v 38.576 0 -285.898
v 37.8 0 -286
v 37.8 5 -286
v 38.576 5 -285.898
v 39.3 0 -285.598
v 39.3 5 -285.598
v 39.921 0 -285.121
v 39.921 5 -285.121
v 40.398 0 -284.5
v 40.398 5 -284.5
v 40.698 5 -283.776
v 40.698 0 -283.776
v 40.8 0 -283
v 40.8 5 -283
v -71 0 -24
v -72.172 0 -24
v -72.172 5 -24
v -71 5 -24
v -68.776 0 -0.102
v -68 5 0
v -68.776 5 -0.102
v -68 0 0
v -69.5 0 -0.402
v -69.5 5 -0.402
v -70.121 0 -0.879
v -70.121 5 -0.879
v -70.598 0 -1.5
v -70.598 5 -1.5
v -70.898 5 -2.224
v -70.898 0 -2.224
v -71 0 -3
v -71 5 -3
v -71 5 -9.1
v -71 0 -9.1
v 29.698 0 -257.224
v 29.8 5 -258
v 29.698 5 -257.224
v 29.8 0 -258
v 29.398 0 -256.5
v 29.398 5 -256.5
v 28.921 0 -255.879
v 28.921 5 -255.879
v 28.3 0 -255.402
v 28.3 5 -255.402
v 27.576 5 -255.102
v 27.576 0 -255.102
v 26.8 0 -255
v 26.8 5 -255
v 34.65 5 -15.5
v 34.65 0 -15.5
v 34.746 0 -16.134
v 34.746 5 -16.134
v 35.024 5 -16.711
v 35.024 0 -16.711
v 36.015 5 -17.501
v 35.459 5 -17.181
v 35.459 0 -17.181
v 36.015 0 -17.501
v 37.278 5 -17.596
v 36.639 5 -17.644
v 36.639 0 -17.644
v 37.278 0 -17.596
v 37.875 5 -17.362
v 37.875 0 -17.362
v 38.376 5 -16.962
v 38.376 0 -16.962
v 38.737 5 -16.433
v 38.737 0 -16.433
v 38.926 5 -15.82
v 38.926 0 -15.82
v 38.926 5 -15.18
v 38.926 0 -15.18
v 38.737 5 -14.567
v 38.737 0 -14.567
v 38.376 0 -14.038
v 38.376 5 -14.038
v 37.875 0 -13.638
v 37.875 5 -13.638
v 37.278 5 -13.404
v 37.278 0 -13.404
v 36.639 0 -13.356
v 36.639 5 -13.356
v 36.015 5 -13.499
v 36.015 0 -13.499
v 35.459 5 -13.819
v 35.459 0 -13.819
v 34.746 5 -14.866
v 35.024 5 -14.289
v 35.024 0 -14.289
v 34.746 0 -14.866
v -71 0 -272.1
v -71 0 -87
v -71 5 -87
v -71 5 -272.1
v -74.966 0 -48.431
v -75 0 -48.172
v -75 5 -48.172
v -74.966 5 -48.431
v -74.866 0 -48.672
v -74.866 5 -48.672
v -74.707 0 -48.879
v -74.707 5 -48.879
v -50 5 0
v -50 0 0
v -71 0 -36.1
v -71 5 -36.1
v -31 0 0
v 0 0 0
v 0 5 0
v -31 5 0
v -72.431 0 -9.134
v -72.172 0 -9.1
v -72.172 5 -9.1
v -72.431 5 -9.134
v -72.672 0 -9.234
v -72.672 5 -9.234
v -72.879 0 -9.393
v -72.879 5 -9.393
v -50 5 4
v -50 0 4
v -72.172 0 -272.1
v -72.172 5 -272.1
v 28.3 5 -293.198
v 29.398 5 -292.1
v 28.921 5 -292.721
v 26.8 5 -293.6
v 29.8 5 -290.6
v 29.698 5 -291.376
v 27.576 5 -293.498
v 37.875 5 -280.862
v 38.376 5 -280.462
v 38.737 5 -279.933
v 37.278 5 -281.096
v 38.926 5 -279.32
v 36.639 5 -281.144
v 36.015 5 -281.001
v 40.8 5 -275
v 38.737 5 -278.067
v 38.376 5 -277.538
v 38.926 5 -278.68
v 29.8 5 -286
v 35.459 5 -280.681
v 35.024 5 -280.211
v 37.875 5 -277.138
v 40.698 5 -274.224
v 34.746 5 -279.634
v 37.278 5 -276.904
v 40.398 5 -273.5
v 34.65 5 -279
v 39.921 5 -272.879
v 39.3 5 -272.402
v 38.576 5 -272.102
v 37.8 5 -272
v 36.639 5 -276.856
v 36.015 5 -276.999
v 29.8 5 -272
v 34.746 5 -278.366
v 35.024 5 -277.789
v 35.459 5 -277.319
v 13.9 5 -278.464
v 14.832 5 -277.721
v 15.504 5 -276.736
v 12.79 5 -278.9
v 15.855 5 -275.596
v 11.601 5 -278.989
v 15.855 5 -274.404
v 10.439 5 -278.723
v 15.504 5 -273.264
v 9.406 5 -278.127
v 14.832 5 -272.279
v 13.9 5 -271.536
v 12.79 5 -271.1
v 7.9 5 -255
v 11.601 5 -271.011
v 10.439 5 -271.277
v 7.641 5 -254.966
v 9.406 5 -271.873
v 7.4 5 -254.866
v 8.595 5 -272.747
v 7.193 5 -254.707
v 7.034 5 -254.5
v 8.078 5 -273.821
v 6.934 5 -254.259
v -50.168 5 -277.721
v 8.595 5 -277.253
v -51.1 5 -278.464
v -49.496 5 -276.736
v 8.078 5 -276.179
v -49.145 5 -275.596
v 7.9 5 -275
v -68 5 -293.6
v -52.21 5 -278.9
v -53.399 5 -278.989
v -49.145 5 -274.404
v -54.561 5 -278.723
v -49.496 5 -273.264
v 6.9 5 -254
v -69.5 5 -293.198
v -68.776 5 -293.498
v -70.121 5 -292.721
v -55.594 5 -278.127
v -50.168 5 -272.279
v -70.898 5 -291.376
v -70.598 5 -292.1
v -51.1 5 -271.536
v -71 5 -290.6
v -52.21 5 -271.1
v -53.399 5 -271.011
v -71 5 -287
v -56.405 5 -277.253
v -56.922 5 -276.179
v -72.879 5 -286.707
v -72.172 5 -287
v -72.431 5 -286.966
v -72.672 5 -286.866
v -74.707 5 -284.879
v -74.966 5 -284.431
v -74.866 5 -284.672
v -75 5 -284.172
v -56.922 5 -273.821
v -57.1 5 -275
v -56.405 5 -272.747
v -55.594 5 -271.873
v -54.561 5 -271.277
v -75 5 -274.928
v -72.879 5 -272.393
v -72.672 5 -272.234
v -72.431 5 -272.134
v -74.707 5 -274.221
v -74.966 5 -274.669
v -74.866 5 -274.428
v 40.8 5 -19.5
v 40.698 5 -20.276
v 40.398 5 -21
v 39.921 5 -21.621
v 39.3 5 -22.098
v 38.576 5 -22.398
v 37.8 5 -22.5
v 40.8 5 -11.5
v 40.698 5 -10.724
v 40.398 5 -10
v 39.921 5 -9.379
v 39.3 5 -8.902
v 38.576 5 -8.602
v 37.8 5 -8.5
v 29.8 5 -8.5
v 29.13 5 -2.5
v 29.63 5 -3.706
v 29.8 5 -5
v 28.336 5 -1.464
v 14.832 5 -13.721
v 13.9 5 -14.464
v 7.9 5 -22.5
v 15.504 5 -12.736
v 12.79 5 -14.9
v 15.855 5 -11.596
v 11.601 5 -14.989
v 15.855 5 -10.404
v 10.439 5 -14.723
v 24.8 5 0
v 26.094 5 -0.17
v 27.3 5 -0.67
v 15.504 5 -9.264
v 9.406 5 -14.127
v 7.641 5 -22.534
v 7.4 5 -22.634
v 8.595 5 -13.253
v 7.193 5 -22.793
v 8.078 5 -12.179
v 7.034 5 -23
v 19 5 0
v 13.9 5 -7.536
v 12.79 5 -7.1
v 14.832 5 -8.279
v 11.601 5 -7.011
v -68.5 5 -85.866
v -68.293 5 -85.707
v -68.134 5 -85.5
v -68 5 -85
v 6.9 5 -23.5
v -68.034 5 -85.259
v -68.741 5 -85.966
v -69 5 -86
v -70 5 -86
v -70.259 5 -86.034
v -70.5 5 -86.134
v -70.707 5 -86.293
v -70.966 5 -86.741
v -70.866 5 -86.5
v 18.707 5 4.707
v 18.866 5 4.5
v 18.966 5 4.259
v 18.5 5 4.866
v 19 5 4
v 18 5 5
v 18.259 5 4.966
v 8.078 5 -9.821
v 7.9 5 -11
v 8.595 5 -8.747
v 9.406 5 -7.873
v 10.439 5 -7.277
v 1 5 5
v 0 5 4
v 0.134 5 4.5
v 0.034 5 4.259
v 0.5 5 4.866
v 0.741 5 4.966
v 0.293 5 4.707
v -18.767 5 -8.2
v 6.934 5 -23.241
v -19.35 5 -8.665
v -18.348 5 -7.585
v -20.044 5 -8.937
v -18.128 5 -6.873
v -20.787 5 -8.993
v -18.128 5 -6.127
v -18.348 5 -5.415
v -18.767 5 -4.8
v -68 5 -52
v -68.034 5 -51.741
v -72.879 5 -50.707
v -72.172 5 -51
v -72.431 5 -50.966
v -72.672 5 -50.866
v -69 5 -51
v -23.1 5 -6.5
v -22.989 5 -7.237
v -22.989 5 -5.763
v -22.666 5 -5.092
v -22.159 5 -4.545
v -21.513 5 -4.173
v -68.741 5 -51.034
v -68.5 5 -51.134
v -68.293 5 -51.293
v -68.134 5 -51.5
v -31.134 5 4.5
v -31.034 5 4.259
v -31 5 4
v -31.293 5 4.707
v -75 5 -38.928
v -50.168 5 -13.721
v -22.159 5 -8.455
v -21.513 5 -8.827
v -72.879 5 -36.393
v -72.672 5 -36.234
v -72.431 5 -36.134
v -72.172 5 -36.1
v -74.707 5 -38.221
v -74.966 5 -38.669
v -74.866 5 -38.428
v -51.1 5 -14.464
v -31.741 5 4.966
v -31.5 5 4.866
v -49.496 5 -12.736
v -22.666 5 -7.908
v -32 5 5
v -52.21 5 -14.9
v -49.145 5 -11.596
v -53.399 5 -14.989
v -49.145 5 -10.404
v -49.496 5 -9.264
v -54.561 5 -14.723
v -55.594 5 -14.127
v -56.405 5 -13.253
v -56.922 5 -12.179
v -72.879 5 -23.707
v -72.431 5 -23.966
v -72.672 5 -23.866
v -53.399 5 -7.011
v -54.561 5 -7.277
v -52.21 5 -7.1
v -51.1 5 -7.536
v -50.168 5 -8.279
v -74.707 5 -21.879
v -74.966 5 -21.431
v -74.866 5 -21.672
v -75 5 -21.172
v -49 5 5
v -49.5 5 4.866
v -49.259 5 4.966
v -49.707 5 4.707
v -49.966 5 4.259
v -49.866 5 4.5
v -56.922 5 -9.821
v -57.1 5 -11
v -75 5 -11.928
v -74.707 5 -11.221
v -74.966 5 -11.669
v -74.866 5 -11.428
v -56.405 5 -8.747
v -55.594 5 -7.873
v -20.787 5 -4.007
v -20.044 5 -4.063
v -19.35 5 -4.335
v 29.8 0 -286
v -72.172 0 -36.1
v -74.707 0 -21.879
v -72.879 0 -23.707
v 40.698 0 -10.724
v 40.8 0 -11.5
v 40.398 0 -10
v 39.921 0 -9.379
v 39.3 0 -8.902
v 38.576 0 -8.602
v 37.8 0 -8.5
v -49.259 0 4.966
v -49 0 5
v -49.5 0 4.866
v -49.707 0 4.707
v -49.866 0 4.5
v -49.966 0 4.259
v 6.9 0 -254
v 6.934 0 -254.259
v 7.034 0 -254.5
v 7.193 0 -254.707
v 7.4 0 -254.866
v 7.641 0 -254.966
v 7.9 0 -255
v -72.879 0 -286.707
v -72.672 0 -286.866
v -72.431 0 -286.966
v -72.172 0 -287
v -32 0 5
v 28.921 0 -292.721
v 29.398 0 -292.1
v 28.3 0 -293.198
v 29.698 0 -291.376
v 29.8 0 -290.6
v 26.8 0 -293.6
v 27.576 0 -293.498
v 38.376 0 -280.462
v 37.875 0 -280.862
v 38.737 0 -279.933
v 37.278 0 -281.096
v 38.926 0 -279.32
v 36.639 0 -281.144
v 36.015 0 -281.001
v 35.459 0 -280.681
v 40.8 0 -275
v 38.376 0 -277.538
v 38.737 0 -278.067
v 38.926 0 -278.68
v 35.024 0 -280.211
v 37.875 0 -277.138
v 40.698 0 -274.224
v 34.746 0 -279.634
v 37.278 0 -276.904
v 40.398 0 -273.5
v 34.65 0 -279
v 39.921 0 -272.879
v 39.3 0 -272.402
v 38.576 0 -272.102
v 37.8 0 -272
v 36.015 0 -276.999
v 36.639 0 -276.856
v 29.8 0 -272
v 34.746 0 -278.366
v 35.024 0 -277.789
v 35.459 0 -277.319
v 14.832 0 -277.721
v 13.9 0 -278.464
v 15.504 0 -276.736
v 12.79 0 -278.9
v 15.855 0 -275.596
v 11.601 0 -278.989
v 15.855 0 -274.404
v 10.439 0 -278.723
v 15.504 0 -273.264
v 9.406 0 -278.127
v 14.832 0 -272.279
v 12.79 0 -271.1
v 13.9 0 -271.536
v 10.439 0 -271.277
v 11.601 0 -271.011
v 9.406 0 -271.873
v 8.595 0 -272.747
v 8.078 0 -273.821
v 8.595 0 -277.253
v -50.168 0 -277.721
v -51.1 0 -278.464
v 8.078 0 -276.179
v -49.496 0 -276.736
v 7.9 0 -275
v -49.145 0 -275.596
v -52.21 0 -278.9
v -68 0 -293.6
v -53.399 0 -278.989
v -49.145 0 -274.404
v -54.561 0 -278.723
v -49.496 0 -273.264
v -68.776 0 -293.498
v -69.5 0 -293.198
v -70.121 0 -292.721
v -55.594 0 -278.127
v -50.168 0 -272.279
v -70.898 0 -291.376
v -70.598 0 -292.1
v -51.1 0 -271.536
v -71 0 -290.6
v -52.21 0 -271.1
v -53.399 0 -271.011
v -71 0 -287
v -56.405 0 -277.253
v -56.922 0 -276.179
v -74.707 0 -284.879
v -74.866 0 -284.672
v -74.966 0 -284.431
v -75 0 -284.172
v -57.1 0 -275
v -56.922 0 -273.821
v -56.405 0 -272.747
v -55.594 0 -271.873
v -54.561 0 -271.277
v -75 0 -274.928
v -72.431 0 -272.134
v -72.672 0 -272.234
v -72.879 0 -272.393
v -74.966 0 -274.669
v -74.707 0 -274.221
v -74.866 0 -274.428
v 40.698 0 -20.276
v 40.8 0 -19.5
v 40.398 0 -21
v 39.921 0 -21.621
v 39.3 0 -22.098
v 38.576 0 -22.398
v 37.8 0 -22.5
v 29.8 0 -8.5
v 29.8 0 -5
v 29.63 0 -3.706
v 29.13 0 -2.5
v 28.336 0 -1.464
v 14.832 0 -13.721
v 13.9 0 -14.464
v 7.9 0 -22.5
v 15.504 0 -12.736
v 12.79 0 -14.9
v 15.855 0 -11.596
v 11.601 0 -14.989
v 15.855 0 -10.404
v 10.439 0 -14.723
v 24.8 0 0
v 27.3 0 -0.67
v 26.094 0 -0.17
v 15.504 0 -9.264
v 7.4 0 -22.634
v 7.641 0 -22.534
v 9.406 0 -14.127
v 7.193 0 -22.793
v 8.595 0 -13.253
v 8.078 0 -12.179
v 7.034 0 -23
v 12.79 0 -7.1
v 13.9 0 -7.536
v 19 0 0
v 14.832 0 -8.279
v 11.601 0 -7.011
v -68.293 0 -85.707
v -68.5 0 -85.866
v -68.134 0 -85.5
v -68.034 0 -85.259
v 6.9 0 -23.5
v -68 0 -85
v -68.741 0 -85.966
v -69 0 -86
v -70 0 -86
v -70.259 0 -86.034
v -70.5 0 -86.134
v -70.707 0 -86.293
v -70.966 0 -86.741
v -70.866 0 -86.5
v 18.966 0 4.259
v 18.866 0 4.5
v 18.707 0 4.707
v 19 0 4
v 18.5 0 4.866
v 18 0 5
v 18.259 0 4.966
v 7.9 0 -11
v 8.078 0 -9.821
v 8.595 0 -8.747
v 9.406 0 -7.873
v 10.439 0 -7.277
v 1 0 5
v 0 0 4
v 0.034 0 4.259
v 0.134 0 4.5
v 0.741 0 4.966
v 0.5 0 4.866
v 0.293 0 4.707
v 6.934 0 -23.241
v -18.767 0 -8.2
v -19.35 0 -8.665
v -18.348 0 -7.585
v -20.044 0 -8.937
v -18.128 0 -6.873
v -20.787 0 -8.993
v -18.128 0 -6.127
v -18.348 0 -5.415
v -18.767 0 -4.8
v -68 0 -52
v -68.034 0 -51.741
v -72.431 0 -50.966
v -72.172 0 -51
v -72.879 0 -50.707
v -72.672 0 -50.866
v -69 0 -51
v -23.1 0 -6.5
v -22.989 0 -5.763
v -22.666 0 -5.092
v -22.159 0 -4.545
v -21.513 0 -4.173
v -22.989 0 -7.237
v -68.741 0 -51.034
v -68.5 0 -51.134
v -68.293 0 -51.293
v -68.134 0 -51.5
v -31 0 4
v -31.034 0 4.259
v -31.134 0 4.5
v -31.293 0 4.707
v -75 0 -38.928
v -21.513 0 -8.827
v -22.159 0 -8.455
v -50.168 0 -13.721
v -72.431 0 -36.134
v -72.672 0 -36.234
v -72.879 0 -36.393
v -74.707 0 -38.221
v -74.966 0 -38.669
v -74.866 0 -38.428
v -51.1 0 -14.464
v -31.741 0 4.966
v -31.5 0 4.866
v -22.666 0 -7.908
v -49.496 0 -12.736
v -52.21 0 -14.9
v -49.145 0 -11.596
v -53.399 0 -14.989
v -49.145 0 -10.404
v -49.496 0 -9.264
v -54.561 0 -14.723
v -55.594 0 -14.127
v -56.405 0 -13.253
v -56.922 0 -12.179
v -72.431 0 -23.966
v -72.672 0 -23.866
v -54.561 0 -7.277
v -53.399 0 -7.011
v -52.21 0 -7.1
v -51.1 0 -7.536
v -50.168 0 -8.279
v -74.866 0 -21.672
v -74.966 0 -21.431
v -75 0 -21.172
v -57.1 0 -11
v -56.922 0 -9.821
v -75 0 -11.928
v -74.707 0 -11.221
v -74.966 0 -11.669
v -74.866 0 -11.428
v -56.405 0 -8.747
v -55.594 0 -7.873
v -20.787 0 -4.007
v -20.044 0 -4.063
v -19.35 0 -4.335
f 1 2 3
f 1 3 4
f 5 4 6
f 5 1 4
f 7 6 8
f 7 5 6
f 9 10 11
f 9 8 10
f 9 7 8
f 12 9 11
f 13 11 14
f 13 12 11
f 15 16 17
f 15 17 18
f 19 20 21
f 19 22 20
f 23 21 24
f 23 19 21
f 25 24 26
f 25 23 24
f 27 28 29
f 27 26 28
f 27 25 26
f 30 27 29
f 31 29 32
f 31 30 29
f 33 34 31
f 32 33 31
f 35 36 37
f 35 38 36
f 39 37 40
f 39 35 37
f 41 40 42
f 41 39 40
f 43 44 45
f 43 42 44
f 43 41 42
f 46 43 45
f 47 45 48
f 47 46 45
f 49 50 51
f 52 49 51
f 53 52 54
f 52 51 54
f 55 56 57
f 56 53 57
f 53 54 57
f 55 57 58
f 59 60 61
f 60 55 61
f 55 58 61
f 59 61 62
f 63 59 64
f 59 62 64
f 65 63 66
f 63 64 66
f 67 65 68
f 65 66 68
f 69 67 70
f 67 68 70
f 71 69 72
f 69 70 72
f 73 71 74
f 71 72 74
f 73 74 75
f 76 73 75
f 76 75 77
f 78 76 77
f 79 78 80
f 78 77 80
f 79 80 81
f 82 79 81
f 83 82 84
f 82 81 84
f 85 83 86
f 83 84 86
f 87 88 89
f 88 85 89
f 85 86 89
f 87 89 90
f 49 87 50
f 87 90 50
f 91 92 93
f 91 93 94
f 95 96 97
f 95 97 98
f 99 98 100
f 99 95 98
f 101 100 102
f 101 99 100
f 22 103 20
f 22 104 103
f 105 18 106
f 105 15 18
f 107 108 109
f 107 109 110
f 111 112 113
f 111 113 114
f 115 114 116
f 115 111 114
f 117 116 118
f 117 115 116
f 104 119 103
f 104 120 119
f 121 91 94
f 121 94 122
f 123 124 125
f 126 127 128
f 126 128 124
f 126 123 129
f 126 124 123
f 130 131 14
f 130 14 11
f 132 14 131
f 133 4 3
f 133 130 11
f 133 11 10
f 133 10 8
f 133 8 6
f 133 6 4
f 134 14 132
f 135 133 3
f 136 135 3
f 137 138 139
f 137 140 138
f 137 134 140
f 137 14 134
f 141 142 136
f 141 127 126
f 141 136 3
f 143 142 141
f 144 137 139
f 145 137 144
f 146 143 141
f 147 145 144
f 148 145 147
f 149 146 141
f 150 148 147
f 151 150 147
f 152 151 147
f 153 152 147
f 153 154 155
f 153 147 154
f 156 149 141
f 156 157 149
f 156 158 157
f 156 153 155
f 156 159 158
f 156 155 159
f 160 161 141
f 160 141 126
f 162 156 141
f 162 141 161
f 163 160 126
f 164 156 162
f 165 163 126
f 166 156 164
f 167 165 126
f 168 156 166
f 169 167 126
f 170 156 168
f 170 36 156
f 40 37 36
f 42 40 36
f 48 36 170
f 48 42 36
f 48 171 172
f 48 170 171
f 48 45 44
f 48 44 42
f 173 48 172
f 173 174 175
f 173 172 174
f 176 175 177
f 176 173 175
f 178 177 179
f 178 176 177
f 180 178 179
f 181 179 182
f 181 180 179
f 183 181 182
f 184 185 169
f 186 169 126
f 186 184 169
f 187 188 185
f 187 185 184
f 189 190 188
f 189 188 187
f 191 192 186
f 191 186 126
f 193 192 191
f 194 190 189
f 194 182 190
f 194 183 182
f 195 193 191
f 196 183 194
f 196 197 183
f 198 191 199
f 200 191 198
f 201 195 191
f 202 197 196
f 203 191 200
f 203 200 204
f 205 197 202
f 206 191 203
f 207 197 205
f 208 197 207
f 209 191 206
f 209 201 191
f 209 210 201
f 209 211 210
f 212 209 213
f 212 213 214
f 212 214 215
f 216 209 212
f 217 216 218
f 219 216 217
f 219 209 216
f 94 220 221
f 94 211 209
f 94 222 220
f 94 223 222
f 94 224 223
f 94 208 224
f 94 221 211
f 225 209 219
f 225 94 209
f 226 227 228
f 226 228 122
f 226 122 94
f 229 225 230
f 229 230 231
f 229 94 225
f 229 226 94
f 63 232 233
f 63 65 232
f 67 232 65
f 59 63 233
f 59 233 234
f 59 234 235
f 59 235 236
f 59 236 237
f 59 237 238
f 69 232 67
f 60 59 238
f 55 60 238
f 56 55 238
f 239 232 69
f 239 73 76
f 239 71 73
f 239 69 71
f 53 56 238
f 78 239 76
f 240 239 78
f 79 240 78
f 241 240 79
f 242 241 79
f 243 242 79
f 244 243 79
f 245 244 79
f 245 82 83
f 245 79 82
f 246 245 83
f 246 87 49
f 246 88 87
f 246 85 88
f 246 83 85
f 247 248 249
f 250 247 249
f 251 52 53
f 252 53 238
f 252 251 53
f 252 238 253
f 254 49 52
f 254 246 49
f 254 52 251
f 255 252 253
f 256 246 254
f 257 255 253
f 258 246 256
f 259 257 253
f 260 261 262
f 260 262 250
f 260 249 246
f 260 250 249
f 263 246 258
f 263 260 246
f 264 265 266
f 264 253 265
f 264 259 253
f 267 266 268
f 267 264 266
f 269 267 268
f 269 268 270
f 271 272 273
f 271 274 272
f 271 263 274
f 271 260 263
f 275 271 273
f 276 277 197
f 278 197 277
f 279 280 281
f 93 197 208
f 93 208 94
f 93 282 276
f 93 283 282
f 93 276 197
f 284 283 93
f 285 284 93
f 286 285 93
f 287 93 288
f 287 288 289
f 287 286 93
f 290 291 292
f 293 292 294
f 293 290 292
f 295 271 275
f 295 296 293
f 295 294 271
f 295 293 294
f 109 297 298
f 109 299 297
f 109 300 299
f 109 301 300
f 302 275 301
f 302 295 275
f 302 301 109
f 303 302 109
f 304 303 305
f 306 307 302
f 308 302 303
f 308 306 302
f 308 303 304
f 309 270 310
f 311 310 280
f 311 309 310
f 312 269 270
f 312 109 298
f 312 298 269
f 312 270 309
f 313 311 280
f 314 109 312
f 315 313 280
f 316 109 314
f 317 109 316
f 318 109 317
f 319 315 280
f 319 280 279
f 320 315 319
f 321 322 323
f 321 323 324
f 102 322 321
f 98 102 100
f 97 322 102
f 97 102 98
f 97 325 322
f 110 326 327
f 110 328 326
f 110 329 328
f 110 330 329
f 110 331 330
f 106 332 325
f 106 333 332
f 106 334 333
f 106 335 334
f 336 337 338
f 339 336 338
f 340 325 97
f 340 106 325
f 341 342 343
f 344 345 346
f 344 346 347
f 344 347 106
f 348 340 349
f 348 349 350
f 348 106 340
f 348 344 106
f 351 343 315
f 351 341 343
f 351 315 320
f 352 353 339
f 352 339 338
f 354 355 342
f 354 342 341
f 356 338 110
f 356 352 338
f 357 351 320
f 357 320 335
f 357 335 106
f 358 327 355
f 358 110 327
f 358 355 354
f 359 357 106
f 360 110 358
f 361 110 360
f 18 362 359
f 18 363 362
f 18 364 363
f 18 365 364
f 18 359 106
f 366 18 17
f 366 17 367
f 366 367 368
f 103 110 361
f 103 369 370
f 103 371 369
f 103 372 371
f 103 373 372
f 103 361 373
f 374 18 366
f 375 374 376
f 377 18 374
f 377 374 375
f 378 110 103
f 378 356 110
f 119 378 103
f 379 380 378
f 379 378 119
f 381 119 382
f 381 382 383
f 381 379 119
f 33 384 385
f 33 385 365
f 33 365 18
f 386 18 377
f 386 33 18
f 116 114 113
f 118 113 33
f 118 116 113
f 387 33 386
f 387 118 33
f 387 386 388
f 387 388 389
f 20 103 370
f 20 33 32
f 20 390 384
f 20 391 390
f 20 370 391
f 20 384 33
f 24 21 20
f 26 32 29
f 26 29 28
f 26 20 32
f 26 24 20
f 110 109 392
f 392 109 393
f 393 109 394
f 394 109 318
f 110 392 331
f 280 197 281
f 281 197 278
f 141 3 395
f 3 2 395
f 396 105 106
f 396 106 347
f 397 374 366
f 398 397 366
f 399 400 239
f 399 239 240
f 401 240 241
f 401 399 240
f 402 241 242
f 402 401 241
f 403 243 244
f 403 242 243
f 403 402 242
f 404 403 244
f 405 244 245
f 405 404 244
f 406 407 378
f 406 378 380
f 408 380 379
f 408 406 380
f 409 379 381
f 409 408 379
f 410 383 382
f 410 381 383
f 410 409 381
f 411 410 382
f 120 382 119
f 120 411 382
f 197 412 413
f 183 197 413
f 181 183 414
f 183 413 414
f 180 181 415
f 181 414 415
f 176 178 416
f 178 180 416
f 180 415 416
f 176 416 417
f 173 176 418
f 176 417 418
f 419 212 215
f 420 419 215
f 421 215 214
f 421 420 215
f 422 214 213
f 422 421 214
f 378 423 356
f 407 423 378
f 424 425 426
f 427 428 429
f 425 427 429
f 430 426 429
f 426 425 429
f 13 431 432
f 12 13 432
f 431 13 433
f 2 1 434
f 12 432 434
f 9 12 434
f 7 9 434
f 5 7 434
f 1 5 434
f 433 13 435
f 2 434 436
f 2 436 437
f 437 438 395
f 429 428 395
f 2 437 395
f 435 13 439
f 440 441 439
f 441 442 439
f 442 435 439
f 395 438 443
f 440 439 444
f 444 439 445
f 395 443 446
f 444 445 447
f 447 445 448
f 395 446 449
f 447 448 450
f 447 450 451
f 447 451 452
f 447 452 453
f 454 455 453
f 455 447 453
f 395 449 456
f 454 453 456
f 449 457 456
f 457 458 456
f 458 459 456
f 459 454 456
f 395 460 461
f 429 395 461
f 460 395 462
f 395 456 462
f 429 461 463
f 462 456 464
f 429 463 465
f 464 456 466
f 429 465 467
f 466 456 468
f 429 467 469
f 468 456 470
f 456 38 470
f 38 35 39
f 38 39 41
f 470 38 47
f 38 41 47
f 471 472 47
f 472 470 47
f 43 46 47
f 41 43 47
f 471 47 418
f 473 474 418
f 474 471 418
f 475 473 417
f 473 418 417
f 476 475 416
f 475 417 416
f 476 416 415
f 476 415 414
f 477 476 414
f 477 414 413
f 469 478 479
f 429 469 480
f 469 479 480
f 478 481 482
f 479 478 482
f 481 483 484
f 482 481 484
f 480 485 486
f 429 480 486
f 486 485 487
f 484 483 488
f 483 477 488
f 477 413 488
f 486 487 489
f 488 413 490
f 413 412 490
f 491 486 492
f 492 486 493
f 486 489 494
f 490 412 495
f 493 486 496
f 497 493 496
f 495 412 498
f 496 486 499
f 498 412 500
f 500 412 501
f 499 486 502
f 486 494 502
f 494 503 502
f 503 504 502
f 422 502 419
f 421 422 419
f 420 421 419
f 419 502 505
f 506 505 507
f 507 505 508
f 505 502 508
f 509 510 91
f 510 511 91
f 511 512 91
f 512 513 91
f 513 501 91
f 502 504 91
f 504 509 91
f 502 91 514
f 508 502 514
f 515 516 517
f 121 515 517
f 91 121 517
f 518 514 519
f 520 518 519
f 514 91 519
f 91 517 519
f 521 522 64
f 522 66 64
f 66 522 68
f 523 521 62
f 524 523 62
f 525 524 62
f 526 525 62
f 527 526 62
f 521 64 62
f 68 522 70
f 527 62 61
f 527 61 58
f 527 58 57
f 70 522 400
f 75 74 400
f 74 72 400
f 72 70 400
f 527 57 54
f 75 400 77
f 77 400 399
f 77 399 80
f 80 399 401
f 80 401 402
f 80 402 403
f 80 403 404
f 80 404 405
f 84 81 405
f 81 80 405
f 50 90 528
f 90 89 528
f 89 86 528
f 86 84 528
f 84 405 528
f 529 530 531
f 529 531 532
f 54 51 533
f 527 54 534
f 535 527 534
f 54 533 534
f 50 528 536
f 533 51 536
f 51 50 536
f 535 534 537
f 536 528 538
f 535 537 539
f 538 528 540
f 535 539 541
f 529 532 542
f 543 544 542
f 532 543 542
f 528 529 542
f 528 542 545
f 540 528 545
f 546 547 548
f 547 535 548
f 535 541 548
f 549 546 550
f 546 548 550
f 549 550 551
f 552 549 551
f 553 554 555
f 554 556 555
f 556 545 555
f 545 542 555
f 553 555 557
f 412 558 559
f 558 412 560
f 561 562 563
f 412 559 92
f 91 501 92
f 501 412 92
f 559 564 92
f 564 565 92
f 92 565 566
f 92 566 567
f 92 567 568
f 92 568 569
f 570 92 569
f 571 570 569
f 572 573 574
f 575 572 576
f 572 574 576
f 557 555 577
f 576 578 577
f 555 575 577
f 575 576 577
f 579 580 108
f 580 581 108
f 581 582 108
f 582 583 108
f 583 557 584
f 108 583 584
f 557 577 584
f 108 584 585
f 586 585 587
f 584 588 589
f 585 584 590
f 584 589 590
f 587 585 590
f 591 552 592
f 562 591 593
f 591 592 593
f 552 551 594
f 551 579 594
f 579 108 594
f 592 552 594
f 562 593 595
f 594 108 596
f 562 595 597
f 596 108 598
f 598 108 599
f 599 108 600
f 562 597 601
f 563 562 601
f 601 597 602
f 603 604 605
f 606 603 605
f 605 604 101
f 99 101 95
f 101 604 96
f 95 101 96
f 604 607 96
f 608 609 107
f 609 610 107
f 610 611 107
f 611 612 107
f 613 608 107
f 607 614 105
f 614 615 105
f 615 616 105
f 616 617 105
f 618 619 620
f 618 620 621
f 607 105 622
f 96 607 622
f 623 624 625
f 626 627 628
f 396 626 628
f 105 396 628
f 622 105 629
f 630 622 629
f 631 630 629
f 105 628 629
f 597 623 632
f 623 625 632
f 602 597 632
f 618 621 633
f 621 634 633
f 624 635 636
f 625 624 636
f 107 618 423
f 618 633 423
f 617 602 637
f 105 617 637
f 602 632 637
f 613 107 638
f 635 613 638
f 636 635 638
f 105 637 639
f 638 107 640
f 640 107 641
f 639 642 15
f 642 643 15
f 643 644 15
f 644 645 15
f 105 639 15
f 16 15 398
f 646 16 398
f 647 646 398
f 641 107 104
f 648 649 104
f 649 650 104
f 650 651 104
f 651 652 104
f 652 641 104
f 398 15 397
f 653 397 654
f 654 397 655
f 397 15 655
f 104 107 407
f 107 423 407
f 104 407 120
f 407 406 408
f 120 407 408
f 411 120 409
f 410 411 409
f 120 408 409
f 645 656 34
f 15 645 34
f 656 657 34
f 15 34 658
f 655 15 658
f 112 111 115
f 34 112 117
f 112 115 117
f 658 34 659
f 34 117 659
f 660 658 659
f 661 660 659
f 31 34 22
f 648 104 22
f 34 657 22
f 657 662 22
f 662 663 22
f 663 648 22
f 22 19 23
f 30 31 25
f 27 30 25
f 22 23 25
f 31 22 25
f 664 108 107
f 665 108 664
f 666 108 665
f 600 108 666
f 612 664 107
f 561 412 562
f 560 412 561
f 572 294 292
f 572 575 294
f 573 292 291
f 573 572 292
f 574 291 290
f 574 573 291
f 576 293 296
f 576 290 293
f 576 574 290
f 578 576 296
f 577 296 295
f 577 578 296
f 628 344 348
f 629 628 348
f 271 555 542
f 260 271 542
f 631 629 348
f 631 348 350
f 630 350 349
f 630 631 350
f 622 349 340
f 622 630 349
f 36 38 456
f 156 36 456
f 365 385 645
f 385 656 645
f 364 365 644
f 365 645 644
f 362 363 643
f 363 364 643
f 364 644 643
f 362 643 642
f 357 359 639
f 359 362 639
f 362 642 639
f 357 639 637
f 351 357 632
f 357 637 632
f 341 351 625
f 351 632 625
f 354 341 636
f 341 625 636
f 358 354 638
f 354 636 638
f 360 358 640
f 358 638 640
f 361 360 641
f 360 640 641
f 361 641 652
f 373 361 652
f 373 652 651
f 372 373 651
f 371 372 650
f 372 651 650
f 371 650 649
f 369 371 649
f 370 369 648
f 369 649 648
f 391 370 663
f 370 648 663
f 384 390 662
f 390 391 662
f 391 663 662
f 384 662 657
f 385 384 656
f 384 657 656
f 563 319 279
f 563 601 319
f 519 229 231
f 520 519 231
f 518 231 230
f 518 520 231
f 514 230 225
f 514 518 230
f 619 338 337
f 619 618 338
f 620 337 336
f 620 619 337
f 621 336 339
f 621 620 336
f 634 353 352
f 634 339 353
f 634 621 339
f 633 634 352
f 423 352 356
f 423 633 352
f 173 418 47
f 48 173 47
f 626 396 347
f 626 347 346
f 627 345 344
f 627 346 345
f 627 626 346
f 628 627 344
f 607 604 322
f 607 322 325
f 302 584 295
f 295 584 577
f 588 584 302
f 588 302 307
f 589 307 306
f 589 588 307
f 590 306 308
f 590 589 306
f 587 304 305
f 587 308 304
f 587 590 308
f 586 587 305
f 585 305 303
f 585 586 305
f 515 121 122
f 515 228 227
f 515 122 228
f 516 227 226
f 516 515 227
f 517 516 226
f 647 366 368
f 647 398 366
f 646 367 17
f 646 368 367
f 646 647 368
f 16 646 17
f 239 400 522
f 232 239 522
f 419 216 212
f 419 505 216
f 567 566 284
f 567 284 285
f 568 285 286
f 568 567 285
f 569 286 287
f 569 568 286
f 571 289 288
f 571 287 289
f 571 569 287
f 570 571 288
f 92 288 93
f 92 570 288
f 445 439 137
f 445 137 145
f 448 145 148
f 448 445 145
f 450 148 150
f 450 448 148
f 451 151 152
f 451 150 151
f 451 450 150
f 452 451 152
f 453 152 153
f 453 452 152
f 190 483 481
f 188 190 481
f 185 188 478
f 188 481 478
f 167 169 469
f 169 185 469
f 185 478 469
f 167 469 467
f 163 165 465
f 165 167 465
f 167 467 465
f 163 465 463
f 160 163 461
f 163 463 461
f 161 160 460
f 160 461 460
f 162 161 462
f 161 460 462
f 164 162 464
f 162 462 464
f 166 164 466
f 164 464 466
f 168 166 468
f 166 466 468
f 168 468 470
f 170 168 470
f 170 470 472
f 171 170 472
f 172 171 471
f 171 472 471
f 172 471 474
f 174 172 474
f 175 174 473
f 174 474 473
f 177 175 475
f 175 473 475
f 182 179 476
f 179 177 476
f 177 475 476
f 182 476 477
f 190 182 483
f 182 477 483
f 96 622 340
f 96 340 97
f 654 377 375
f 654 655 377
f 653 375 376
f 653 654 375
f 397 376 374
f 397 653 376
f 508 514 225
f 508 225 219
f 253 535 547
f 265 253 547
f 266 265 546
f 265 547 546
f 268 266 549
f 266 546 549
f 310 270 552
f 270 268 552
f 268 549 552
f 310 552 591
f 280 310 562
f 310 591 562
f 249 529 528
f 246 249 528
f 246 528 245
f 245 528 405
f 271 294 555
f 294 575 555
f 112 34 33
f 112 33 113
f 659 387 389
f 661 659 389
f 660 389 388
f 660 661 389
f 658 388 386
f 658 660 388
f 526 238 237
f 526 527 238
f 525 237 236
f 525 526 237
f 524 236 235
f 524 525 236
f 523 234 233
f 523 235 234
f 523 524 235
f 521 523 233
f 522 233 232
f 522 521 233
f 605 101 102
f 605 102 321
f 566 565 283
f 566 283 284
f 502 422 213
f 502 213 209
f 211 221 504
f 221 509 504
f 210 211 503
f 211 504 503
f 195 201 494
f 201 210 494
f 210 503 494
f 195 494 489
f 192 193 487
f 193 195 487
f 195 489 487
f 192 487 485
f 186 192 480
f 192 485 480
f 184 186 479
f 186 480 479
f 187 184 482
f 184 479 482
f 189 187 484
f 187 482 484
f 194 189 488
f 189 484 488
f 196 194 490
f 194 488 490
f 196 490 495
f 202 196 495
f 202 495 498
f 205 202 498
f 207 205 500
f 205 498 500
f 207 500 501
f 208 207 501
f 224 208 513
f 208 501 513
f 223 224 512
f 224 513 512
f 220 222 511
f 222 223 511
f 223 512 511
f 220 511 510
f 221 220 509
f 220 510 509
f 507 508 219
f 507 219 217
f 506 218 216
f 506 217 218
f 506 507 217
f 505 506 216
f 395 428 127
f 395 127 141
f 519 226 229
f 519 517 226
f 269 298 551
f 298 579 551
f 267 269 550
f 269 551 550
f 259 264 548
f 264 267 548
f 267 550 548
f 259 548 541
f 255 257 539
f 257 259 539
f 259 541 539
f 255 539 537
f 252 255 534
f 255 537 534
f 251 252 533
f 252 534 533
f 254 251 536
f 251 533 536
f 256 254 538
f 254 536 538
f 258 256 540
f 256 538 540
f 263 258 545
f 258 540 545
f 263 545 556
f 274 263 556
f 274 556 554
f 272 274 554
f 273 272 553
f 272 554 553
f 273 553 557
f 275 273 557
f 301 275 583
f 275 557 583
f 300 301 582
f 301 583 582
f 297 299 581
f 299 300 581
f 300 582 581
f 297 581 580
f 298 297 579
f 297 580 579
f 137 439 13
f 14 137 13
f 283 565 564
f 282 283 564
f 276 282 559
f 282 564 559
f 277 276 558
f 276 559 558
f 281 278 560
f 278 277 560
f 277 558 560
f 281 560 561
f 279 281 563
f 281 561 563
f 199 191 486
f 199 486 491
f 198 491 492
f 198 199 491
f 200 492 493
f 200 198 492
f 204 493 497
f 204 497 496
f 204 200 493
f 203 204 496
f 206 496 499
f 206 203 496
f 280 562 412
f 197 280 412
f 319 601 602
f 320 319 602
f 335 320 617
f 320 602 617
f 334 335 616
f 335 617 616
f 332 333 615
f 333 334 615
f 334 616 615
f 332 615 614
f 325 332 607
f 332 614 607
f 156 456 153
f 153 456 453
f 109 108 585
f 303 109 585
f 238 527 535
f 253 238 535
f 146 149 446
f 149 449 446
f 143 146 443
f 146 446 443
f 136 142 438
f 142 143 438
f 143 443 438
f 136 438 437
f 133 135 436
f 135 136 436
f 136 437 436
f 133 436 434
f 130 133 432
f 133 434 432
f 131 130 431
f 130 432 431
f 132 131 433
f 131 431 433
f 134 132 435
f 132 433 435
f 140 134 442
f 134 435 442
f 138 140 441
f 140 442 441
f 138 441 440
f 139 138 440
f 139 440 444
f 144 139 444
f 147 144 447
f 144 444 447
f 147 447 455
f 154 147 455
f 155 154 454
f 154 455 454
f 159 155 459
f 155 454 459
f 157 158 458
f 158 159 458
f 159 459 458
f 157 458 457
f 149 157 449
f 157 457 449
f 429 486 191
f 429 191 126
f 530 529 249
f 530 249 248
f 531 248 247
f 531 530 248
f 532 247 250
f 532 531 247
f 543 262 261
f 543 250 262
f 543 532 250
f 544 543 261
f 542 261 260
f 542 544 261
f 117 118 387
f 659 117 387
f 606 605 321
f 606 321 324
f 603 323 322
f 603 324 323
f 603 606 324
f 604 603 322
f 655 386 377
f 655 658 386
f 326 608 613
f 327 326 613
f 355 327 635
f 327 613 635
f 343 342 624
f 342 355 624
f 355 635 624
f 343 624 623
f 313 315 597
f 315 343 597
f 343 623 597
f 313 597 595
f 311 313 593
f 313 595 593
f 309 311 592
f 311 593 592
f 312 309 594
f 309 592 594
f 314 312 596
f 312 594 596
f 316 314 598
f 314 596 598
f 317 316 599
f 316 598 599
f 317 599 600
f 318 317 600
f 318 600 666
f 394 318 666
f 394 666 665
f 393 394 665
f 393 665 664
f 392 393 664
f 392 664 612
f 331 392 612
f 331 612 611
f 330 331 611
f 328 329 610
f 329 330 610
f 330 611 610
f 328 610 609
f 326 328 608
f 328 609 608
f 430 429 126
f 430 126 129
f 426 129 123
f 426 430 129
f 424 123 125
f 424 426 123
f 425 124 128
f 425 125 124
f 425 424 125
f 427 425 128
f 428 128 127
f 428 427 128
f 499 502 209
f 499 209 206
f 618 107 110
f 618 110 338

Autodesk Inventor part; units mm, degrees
ref_plane "YZ Plane" through (0, 0, 0) normal (1, 0, 0) x (0, 1, 0)
ref_plane "XZ Plane" through (0, 0, 0) normal (0, 1, 0) x (-1, 0, 0)
ref_plane "XY Plane" through (0, 0, 0) normal (0, 0, 1) x (1, 0, 0)
sketch "Sketch1" plane through (0, 0, 0) normal (0, 1, 0) x (-1, 0, 0)
  line L0 (0, 0) -> (31, 0)
  line L1 (31, 0) -> (31, 4)
  line L2 (32, 5) -> (49, 5)
  line L3 (50, 4) -> (50, 0)
  line L4 (50, 0) -> (68, 0)
  line L5 (68, -52) -> (68, -85)
  line L6 (69, -86) -> (70, -86)
  line L7 (71, -87) -> (71, -272.1)
  line L8 (71, -272.1) -> (72.1718, -272.1)
  line L9 (72.8789, -272.3929) -> (74.7071, -274.2211)
  line L10 (75, -274.9282) -> (75, -284.1718)
  line L11 (74.7071, -284.8789) -> (72.8789, -286.7071)
  line L12 (72.1718, -287) -> (71, -287)
  line L13 (71, -287) -> (71, -293.6)
  line L14 (71, -293.6) -> (-26.8, -293.6)
  line L15 (-29.8, -290.6) -> (-29.8, -286)
  line L16 (0, 0) -> (0, 4)
  line L17 (-1, 5) -> (-18, 5)
  line L18 (-19, 4) -> (-19, 0)
  line L19 (-19, 0) -> (-24.8, 0)
  line L20 (-29.8, -5) -> (-29.8, -8.5)
  line L21 (-29.8, -8.5) -> (-37.8, -8.5)
  line L22 (-40.8, -11.5) -> (-40.8, -19.5)
  line L23 (-37.8, -22.5) -> (-7.9, -22.5)
  line L24 (-6.9, -23.5) -> (-6.9, -254)
  line L25 (-7.9, -255) -> (-26.8, -255)
  line L26 (-29.8, -258) -> (-29.8, -272)
  line L27 (-29.8, -272) -> (-37.8, -272)
  line L28 (-40.8, -275) -> (-40.8, -283)
  line L29 (-37.8, -286) -> (-29.8, -286)
  circle A0 centre (53.1, -11) radius 4
  circle A1 centre (-11.9, -11) radius 4
  circle A2 centre (53.1, -275) radius 4
  circle A3 centre (-11.9, -275) radius 4
  line L30 (69, -51) -> (70, -51)
  arc A4 (-18, 5) -> (-19, 4) centre (-18, 4) ccw
  arc A5 (0, 4) -> (-1, 5) centre (-1, 4) ccw
  arc A6 (32, 5) -> (31, 4) centre (32, 4) ccw
  arc A7 (50, 4) -> (49, 5) centre (49, 4) ccw
  arc A8 (-24.8, 0) -> (-29.8, -5) centre (-24.8, -5) ccw
  arc A9 (-7.9, -255) -> (-6.9, -254) centre (-7.9, -254) ccw
  arc A10 (-26.8, -255) -> (-29.8, -258) centre (-26.8, -258) ccw
  arc A11 (-37.8, -272) -> (-40.8, -275) centre (-37.8, -275) ccw
  arc A12 (-40.8, -283) -> (-37.8, -286) centre (-37.8, -283) ccw
  arc A13 (-40.8, -19.5) -> (-37.8, -22.5) centre (-37.8, -19.5) ccw
  arc A14 (-37.8, -8.5) -> (-40.8, -11.5) centre (-37.8, -11.5) ccw
  arc A15 (72.8789, -272.3929) -> (72.1718, -272.1) centre (72.1718, -273.1) ccw
  arc A16 (75, -274.9282) -> (74.7071, -274.2211) centre (74, -274.9282) ccw
  arc A17 (74.7071, -284.8789) -> (75, -284.1718) centre (74, -284.1718) ccw
  arc A18 (72.1718, -287) -> (72.8789, -286.7071) centre (72.1718, -286) ccw
  line L31 (71, -9.1) -> (72.1718, -9.1)
  line L32 (72.8789, -9.3929) -> (74.7071, -11.2211)
  line L33 (75, -11.9282) -> (75, -21.1718)
  line L34 (74.7071, -21.8789) -> (72.8789, -23.7071)
  line L35 (72.1718, -24) -> (71, -24)
  arc A19 (72.8789, -9.3929) -> (72.1718, -9.1) centre (72.1718, -10.1) ccw
  arc A20 (75, -11.9282) -> (74.7071, -11.2211) centre (74, -11.9282) ccw
  arc A21 (74.7071, -21.8789) -> (75, -21.1718) centre (74, -21.1718) ccw
  arc A22 (72.1718, -24) -> (72.8789, -23.7071) centre (72.1718, -23) ccw
  line L36 (71, -36.1) -> (72.1718, -36.1)
  line L37 (72.8789, -36.3929) -> (74.7071, -38.2211)
  line L38 (75, -38.9282) -> (75, -48.1718)
  line L39 (74.7071, -48.8789) -> (72.8789, -50.7071)
  line L40 (72.1718, -51) -> (71, -51)
  arc A23 (72.8789, -36.3929) -> (72.1718, -36.1) centre (72.1718, -37.1) ccw
  arc A24 (75, -38.9282) -> (74.7071, -38.2211) centre (74, -38.9282) ccw
  arc A25 (74.7071, -48.8789) -> (75, -48.1718) centre (74, -48.1718) ccw
  arc A26 (72.1718, -51) -> (72.8789, -50.7071) centre (72.1718, -50) ccw
  line L41 (71, -9.1) -> (71, -3)
  line L42 (71, -24) -> (71, -36.1)
  arc A27 (69, -51) -> (68, -52) centre (69, -52) ccw
  arc A28 (68, -85) -> (69, -86) centre (69, -85) ccw
  arc A29 (71, -87) -> (70, -86) centre (70, -87) ccw
  line L43 (71, -51) -> (70, -51)
  arc A30 (71, -3) -> (68, 0) centre (68, -3) ccw
  arc A31 (-6.9, -23.5) -> (-7.9, -22.5) centre (-7.9, -23.5) ccw
  arc A32 (-29.8, -290.6) -> (-26.8, -293.6) centre (-26.8, -290.6) ccw
  circle A33 centre (-36.8, -15.5) radius 2.15
  circle A34 centre (-36.8, -279) radius 2.15
  circle A35 centre (20.6, -6.5) radius 2.5
  point P0 (31, 5)
  point P1 (50, 5)
  point P2 (71, 0)
  point P3 (68, -86)
  point P4 (71, -86)
  point P5 (72.586, -272.1)
  point P6 (72.586, -287)
  point P7 (0, 5)
  point P8 (59, 0)
  point P9 (50, 2)
  point P10 (71, -5)
  point P11 (-22.85, -22.5)
  point P12 (-33.8, -8.5)
  point P13 (71.5859, -287)
  point P14 (71.8793, -10)
  point P15 (69.5, -51)
  point P16 (-21.9, 0)
  point P17 (71.5859, -24)
  point P18 (71.5859, -51)
  point P19 (69.5, -86)
  point P20 (-29.8, -6.75)
  point P21 (40.5, 5)
  dimension "d0" = 90
  dimension "d1" = 31
  dimension "d3" = 19
  dimension "d4" = 19
  dimension "d8" = 14
  dimension "d10" = 0
  dimension "d11" = 8
  dimension "d12" = 11
  dimension "d13" = 8
  dimension "d14" = 65
  dimension "d15" = 8
  dimension "d16" = 8
  dimension "d17" = 264
  dimension "d18" = 264
  dimension "d21" = 3
  dimension "d24" = 51
  dimension "d25" = 5
  dimension "d26" = 5
  dimension "d27" = 1
  dimension "d28" = 5
  dimension "d30" = 77.9
  dimension "d32" = 1
  dimension "d33" = 3
  dimension "d34" = 17
  dimension "d35" = 14
  dimension "d36" = 11
  dimension "d37" = 3
  dimension "d38" = 22.5
  dimension "d39" = 33.9
  dimension "d40" = 3
  dimension "d41" = 11
  dimension "d42" = 4
  dimension "d43" = 14.9
  dimension "d44" = 6.6
  dimension "d45" = 1.586
  dimension "d46" = 135
  dimension "d47" = 1.586
  dimension "d48" = 135
  dimension "d49" = 1
  dimension "d50" = 14.9
  dimension "d51" = 135
  dimension "d52" = 135
  dimension "d53" = 1
  dimension "d54" = 14.9
  dimension "d55" = 135
  dimension "d56" = 135
  dimension "d57" = 1
  dimension "d58" = 9.1
  dimension "d59" = 12.1
  dimension "d61" = 1
  dimension "d62" = 35
  dimension "d63" = 100.8
  dimension "d64" = 38.6
  dimension "d67" = 3
  dimension "d68" = 1
  dimension "d69" = 3
  dimension "d70" = 232.5
  dimension "d71" = 27.5
  dimension "d74" = 293.6
  dimension "d75" = 185.1
  dimension "d76" = 4.3
  dimension "d77" = 4
  dimension "d78" = 7
  dimension "d79" = 4
extrude "Extrusion1" add sketch "Sketch1" along normal blind 5 contours L0 L1 A6 L2 A7 L3 L4 A30 L41 L31 A19 L32 A20 L33 A21 L34 A22 L35 L42 L36 A23 L37 A24 L38 A25 L39 A26 L40 L43 L30 A27 L5 A28 L6 A29 L7 L8 A15 L9 A16 L10 A17 L11 A18 L12 L13 L14 A32 L15 L29 A12 L28 A11 L27 L26 A10 L25 A9 L24 A31 L23 A13 L22 A14 L21 L20 A8 L19 L18 A4 L17 A5 L16 | A33 | A34 | A35
extrude "Extrusion2" cut sketch "Sketch1" along normal blind 5 contours A33 | A34 | A35
fillet "Fillet1" radius 3 1 edges at (-71, 2.5, -293.6)
thread "Thread1" size "M8x1.25" class "6H" standard "ANSI Metric M Profile" length 5
thread "Thread2" size "M8x1.25" class "6H" standard "ANSI Metric M Profile" length 5
thread "Thread3" size "M8x1.25" class "6H" standard "ANSI Metric M Profile" length 5
thread "Thread4" size "M8x1.25" class "6H" standard "ANSI Metric M Profile" length 5
properties part number "21-30-220-B2"
